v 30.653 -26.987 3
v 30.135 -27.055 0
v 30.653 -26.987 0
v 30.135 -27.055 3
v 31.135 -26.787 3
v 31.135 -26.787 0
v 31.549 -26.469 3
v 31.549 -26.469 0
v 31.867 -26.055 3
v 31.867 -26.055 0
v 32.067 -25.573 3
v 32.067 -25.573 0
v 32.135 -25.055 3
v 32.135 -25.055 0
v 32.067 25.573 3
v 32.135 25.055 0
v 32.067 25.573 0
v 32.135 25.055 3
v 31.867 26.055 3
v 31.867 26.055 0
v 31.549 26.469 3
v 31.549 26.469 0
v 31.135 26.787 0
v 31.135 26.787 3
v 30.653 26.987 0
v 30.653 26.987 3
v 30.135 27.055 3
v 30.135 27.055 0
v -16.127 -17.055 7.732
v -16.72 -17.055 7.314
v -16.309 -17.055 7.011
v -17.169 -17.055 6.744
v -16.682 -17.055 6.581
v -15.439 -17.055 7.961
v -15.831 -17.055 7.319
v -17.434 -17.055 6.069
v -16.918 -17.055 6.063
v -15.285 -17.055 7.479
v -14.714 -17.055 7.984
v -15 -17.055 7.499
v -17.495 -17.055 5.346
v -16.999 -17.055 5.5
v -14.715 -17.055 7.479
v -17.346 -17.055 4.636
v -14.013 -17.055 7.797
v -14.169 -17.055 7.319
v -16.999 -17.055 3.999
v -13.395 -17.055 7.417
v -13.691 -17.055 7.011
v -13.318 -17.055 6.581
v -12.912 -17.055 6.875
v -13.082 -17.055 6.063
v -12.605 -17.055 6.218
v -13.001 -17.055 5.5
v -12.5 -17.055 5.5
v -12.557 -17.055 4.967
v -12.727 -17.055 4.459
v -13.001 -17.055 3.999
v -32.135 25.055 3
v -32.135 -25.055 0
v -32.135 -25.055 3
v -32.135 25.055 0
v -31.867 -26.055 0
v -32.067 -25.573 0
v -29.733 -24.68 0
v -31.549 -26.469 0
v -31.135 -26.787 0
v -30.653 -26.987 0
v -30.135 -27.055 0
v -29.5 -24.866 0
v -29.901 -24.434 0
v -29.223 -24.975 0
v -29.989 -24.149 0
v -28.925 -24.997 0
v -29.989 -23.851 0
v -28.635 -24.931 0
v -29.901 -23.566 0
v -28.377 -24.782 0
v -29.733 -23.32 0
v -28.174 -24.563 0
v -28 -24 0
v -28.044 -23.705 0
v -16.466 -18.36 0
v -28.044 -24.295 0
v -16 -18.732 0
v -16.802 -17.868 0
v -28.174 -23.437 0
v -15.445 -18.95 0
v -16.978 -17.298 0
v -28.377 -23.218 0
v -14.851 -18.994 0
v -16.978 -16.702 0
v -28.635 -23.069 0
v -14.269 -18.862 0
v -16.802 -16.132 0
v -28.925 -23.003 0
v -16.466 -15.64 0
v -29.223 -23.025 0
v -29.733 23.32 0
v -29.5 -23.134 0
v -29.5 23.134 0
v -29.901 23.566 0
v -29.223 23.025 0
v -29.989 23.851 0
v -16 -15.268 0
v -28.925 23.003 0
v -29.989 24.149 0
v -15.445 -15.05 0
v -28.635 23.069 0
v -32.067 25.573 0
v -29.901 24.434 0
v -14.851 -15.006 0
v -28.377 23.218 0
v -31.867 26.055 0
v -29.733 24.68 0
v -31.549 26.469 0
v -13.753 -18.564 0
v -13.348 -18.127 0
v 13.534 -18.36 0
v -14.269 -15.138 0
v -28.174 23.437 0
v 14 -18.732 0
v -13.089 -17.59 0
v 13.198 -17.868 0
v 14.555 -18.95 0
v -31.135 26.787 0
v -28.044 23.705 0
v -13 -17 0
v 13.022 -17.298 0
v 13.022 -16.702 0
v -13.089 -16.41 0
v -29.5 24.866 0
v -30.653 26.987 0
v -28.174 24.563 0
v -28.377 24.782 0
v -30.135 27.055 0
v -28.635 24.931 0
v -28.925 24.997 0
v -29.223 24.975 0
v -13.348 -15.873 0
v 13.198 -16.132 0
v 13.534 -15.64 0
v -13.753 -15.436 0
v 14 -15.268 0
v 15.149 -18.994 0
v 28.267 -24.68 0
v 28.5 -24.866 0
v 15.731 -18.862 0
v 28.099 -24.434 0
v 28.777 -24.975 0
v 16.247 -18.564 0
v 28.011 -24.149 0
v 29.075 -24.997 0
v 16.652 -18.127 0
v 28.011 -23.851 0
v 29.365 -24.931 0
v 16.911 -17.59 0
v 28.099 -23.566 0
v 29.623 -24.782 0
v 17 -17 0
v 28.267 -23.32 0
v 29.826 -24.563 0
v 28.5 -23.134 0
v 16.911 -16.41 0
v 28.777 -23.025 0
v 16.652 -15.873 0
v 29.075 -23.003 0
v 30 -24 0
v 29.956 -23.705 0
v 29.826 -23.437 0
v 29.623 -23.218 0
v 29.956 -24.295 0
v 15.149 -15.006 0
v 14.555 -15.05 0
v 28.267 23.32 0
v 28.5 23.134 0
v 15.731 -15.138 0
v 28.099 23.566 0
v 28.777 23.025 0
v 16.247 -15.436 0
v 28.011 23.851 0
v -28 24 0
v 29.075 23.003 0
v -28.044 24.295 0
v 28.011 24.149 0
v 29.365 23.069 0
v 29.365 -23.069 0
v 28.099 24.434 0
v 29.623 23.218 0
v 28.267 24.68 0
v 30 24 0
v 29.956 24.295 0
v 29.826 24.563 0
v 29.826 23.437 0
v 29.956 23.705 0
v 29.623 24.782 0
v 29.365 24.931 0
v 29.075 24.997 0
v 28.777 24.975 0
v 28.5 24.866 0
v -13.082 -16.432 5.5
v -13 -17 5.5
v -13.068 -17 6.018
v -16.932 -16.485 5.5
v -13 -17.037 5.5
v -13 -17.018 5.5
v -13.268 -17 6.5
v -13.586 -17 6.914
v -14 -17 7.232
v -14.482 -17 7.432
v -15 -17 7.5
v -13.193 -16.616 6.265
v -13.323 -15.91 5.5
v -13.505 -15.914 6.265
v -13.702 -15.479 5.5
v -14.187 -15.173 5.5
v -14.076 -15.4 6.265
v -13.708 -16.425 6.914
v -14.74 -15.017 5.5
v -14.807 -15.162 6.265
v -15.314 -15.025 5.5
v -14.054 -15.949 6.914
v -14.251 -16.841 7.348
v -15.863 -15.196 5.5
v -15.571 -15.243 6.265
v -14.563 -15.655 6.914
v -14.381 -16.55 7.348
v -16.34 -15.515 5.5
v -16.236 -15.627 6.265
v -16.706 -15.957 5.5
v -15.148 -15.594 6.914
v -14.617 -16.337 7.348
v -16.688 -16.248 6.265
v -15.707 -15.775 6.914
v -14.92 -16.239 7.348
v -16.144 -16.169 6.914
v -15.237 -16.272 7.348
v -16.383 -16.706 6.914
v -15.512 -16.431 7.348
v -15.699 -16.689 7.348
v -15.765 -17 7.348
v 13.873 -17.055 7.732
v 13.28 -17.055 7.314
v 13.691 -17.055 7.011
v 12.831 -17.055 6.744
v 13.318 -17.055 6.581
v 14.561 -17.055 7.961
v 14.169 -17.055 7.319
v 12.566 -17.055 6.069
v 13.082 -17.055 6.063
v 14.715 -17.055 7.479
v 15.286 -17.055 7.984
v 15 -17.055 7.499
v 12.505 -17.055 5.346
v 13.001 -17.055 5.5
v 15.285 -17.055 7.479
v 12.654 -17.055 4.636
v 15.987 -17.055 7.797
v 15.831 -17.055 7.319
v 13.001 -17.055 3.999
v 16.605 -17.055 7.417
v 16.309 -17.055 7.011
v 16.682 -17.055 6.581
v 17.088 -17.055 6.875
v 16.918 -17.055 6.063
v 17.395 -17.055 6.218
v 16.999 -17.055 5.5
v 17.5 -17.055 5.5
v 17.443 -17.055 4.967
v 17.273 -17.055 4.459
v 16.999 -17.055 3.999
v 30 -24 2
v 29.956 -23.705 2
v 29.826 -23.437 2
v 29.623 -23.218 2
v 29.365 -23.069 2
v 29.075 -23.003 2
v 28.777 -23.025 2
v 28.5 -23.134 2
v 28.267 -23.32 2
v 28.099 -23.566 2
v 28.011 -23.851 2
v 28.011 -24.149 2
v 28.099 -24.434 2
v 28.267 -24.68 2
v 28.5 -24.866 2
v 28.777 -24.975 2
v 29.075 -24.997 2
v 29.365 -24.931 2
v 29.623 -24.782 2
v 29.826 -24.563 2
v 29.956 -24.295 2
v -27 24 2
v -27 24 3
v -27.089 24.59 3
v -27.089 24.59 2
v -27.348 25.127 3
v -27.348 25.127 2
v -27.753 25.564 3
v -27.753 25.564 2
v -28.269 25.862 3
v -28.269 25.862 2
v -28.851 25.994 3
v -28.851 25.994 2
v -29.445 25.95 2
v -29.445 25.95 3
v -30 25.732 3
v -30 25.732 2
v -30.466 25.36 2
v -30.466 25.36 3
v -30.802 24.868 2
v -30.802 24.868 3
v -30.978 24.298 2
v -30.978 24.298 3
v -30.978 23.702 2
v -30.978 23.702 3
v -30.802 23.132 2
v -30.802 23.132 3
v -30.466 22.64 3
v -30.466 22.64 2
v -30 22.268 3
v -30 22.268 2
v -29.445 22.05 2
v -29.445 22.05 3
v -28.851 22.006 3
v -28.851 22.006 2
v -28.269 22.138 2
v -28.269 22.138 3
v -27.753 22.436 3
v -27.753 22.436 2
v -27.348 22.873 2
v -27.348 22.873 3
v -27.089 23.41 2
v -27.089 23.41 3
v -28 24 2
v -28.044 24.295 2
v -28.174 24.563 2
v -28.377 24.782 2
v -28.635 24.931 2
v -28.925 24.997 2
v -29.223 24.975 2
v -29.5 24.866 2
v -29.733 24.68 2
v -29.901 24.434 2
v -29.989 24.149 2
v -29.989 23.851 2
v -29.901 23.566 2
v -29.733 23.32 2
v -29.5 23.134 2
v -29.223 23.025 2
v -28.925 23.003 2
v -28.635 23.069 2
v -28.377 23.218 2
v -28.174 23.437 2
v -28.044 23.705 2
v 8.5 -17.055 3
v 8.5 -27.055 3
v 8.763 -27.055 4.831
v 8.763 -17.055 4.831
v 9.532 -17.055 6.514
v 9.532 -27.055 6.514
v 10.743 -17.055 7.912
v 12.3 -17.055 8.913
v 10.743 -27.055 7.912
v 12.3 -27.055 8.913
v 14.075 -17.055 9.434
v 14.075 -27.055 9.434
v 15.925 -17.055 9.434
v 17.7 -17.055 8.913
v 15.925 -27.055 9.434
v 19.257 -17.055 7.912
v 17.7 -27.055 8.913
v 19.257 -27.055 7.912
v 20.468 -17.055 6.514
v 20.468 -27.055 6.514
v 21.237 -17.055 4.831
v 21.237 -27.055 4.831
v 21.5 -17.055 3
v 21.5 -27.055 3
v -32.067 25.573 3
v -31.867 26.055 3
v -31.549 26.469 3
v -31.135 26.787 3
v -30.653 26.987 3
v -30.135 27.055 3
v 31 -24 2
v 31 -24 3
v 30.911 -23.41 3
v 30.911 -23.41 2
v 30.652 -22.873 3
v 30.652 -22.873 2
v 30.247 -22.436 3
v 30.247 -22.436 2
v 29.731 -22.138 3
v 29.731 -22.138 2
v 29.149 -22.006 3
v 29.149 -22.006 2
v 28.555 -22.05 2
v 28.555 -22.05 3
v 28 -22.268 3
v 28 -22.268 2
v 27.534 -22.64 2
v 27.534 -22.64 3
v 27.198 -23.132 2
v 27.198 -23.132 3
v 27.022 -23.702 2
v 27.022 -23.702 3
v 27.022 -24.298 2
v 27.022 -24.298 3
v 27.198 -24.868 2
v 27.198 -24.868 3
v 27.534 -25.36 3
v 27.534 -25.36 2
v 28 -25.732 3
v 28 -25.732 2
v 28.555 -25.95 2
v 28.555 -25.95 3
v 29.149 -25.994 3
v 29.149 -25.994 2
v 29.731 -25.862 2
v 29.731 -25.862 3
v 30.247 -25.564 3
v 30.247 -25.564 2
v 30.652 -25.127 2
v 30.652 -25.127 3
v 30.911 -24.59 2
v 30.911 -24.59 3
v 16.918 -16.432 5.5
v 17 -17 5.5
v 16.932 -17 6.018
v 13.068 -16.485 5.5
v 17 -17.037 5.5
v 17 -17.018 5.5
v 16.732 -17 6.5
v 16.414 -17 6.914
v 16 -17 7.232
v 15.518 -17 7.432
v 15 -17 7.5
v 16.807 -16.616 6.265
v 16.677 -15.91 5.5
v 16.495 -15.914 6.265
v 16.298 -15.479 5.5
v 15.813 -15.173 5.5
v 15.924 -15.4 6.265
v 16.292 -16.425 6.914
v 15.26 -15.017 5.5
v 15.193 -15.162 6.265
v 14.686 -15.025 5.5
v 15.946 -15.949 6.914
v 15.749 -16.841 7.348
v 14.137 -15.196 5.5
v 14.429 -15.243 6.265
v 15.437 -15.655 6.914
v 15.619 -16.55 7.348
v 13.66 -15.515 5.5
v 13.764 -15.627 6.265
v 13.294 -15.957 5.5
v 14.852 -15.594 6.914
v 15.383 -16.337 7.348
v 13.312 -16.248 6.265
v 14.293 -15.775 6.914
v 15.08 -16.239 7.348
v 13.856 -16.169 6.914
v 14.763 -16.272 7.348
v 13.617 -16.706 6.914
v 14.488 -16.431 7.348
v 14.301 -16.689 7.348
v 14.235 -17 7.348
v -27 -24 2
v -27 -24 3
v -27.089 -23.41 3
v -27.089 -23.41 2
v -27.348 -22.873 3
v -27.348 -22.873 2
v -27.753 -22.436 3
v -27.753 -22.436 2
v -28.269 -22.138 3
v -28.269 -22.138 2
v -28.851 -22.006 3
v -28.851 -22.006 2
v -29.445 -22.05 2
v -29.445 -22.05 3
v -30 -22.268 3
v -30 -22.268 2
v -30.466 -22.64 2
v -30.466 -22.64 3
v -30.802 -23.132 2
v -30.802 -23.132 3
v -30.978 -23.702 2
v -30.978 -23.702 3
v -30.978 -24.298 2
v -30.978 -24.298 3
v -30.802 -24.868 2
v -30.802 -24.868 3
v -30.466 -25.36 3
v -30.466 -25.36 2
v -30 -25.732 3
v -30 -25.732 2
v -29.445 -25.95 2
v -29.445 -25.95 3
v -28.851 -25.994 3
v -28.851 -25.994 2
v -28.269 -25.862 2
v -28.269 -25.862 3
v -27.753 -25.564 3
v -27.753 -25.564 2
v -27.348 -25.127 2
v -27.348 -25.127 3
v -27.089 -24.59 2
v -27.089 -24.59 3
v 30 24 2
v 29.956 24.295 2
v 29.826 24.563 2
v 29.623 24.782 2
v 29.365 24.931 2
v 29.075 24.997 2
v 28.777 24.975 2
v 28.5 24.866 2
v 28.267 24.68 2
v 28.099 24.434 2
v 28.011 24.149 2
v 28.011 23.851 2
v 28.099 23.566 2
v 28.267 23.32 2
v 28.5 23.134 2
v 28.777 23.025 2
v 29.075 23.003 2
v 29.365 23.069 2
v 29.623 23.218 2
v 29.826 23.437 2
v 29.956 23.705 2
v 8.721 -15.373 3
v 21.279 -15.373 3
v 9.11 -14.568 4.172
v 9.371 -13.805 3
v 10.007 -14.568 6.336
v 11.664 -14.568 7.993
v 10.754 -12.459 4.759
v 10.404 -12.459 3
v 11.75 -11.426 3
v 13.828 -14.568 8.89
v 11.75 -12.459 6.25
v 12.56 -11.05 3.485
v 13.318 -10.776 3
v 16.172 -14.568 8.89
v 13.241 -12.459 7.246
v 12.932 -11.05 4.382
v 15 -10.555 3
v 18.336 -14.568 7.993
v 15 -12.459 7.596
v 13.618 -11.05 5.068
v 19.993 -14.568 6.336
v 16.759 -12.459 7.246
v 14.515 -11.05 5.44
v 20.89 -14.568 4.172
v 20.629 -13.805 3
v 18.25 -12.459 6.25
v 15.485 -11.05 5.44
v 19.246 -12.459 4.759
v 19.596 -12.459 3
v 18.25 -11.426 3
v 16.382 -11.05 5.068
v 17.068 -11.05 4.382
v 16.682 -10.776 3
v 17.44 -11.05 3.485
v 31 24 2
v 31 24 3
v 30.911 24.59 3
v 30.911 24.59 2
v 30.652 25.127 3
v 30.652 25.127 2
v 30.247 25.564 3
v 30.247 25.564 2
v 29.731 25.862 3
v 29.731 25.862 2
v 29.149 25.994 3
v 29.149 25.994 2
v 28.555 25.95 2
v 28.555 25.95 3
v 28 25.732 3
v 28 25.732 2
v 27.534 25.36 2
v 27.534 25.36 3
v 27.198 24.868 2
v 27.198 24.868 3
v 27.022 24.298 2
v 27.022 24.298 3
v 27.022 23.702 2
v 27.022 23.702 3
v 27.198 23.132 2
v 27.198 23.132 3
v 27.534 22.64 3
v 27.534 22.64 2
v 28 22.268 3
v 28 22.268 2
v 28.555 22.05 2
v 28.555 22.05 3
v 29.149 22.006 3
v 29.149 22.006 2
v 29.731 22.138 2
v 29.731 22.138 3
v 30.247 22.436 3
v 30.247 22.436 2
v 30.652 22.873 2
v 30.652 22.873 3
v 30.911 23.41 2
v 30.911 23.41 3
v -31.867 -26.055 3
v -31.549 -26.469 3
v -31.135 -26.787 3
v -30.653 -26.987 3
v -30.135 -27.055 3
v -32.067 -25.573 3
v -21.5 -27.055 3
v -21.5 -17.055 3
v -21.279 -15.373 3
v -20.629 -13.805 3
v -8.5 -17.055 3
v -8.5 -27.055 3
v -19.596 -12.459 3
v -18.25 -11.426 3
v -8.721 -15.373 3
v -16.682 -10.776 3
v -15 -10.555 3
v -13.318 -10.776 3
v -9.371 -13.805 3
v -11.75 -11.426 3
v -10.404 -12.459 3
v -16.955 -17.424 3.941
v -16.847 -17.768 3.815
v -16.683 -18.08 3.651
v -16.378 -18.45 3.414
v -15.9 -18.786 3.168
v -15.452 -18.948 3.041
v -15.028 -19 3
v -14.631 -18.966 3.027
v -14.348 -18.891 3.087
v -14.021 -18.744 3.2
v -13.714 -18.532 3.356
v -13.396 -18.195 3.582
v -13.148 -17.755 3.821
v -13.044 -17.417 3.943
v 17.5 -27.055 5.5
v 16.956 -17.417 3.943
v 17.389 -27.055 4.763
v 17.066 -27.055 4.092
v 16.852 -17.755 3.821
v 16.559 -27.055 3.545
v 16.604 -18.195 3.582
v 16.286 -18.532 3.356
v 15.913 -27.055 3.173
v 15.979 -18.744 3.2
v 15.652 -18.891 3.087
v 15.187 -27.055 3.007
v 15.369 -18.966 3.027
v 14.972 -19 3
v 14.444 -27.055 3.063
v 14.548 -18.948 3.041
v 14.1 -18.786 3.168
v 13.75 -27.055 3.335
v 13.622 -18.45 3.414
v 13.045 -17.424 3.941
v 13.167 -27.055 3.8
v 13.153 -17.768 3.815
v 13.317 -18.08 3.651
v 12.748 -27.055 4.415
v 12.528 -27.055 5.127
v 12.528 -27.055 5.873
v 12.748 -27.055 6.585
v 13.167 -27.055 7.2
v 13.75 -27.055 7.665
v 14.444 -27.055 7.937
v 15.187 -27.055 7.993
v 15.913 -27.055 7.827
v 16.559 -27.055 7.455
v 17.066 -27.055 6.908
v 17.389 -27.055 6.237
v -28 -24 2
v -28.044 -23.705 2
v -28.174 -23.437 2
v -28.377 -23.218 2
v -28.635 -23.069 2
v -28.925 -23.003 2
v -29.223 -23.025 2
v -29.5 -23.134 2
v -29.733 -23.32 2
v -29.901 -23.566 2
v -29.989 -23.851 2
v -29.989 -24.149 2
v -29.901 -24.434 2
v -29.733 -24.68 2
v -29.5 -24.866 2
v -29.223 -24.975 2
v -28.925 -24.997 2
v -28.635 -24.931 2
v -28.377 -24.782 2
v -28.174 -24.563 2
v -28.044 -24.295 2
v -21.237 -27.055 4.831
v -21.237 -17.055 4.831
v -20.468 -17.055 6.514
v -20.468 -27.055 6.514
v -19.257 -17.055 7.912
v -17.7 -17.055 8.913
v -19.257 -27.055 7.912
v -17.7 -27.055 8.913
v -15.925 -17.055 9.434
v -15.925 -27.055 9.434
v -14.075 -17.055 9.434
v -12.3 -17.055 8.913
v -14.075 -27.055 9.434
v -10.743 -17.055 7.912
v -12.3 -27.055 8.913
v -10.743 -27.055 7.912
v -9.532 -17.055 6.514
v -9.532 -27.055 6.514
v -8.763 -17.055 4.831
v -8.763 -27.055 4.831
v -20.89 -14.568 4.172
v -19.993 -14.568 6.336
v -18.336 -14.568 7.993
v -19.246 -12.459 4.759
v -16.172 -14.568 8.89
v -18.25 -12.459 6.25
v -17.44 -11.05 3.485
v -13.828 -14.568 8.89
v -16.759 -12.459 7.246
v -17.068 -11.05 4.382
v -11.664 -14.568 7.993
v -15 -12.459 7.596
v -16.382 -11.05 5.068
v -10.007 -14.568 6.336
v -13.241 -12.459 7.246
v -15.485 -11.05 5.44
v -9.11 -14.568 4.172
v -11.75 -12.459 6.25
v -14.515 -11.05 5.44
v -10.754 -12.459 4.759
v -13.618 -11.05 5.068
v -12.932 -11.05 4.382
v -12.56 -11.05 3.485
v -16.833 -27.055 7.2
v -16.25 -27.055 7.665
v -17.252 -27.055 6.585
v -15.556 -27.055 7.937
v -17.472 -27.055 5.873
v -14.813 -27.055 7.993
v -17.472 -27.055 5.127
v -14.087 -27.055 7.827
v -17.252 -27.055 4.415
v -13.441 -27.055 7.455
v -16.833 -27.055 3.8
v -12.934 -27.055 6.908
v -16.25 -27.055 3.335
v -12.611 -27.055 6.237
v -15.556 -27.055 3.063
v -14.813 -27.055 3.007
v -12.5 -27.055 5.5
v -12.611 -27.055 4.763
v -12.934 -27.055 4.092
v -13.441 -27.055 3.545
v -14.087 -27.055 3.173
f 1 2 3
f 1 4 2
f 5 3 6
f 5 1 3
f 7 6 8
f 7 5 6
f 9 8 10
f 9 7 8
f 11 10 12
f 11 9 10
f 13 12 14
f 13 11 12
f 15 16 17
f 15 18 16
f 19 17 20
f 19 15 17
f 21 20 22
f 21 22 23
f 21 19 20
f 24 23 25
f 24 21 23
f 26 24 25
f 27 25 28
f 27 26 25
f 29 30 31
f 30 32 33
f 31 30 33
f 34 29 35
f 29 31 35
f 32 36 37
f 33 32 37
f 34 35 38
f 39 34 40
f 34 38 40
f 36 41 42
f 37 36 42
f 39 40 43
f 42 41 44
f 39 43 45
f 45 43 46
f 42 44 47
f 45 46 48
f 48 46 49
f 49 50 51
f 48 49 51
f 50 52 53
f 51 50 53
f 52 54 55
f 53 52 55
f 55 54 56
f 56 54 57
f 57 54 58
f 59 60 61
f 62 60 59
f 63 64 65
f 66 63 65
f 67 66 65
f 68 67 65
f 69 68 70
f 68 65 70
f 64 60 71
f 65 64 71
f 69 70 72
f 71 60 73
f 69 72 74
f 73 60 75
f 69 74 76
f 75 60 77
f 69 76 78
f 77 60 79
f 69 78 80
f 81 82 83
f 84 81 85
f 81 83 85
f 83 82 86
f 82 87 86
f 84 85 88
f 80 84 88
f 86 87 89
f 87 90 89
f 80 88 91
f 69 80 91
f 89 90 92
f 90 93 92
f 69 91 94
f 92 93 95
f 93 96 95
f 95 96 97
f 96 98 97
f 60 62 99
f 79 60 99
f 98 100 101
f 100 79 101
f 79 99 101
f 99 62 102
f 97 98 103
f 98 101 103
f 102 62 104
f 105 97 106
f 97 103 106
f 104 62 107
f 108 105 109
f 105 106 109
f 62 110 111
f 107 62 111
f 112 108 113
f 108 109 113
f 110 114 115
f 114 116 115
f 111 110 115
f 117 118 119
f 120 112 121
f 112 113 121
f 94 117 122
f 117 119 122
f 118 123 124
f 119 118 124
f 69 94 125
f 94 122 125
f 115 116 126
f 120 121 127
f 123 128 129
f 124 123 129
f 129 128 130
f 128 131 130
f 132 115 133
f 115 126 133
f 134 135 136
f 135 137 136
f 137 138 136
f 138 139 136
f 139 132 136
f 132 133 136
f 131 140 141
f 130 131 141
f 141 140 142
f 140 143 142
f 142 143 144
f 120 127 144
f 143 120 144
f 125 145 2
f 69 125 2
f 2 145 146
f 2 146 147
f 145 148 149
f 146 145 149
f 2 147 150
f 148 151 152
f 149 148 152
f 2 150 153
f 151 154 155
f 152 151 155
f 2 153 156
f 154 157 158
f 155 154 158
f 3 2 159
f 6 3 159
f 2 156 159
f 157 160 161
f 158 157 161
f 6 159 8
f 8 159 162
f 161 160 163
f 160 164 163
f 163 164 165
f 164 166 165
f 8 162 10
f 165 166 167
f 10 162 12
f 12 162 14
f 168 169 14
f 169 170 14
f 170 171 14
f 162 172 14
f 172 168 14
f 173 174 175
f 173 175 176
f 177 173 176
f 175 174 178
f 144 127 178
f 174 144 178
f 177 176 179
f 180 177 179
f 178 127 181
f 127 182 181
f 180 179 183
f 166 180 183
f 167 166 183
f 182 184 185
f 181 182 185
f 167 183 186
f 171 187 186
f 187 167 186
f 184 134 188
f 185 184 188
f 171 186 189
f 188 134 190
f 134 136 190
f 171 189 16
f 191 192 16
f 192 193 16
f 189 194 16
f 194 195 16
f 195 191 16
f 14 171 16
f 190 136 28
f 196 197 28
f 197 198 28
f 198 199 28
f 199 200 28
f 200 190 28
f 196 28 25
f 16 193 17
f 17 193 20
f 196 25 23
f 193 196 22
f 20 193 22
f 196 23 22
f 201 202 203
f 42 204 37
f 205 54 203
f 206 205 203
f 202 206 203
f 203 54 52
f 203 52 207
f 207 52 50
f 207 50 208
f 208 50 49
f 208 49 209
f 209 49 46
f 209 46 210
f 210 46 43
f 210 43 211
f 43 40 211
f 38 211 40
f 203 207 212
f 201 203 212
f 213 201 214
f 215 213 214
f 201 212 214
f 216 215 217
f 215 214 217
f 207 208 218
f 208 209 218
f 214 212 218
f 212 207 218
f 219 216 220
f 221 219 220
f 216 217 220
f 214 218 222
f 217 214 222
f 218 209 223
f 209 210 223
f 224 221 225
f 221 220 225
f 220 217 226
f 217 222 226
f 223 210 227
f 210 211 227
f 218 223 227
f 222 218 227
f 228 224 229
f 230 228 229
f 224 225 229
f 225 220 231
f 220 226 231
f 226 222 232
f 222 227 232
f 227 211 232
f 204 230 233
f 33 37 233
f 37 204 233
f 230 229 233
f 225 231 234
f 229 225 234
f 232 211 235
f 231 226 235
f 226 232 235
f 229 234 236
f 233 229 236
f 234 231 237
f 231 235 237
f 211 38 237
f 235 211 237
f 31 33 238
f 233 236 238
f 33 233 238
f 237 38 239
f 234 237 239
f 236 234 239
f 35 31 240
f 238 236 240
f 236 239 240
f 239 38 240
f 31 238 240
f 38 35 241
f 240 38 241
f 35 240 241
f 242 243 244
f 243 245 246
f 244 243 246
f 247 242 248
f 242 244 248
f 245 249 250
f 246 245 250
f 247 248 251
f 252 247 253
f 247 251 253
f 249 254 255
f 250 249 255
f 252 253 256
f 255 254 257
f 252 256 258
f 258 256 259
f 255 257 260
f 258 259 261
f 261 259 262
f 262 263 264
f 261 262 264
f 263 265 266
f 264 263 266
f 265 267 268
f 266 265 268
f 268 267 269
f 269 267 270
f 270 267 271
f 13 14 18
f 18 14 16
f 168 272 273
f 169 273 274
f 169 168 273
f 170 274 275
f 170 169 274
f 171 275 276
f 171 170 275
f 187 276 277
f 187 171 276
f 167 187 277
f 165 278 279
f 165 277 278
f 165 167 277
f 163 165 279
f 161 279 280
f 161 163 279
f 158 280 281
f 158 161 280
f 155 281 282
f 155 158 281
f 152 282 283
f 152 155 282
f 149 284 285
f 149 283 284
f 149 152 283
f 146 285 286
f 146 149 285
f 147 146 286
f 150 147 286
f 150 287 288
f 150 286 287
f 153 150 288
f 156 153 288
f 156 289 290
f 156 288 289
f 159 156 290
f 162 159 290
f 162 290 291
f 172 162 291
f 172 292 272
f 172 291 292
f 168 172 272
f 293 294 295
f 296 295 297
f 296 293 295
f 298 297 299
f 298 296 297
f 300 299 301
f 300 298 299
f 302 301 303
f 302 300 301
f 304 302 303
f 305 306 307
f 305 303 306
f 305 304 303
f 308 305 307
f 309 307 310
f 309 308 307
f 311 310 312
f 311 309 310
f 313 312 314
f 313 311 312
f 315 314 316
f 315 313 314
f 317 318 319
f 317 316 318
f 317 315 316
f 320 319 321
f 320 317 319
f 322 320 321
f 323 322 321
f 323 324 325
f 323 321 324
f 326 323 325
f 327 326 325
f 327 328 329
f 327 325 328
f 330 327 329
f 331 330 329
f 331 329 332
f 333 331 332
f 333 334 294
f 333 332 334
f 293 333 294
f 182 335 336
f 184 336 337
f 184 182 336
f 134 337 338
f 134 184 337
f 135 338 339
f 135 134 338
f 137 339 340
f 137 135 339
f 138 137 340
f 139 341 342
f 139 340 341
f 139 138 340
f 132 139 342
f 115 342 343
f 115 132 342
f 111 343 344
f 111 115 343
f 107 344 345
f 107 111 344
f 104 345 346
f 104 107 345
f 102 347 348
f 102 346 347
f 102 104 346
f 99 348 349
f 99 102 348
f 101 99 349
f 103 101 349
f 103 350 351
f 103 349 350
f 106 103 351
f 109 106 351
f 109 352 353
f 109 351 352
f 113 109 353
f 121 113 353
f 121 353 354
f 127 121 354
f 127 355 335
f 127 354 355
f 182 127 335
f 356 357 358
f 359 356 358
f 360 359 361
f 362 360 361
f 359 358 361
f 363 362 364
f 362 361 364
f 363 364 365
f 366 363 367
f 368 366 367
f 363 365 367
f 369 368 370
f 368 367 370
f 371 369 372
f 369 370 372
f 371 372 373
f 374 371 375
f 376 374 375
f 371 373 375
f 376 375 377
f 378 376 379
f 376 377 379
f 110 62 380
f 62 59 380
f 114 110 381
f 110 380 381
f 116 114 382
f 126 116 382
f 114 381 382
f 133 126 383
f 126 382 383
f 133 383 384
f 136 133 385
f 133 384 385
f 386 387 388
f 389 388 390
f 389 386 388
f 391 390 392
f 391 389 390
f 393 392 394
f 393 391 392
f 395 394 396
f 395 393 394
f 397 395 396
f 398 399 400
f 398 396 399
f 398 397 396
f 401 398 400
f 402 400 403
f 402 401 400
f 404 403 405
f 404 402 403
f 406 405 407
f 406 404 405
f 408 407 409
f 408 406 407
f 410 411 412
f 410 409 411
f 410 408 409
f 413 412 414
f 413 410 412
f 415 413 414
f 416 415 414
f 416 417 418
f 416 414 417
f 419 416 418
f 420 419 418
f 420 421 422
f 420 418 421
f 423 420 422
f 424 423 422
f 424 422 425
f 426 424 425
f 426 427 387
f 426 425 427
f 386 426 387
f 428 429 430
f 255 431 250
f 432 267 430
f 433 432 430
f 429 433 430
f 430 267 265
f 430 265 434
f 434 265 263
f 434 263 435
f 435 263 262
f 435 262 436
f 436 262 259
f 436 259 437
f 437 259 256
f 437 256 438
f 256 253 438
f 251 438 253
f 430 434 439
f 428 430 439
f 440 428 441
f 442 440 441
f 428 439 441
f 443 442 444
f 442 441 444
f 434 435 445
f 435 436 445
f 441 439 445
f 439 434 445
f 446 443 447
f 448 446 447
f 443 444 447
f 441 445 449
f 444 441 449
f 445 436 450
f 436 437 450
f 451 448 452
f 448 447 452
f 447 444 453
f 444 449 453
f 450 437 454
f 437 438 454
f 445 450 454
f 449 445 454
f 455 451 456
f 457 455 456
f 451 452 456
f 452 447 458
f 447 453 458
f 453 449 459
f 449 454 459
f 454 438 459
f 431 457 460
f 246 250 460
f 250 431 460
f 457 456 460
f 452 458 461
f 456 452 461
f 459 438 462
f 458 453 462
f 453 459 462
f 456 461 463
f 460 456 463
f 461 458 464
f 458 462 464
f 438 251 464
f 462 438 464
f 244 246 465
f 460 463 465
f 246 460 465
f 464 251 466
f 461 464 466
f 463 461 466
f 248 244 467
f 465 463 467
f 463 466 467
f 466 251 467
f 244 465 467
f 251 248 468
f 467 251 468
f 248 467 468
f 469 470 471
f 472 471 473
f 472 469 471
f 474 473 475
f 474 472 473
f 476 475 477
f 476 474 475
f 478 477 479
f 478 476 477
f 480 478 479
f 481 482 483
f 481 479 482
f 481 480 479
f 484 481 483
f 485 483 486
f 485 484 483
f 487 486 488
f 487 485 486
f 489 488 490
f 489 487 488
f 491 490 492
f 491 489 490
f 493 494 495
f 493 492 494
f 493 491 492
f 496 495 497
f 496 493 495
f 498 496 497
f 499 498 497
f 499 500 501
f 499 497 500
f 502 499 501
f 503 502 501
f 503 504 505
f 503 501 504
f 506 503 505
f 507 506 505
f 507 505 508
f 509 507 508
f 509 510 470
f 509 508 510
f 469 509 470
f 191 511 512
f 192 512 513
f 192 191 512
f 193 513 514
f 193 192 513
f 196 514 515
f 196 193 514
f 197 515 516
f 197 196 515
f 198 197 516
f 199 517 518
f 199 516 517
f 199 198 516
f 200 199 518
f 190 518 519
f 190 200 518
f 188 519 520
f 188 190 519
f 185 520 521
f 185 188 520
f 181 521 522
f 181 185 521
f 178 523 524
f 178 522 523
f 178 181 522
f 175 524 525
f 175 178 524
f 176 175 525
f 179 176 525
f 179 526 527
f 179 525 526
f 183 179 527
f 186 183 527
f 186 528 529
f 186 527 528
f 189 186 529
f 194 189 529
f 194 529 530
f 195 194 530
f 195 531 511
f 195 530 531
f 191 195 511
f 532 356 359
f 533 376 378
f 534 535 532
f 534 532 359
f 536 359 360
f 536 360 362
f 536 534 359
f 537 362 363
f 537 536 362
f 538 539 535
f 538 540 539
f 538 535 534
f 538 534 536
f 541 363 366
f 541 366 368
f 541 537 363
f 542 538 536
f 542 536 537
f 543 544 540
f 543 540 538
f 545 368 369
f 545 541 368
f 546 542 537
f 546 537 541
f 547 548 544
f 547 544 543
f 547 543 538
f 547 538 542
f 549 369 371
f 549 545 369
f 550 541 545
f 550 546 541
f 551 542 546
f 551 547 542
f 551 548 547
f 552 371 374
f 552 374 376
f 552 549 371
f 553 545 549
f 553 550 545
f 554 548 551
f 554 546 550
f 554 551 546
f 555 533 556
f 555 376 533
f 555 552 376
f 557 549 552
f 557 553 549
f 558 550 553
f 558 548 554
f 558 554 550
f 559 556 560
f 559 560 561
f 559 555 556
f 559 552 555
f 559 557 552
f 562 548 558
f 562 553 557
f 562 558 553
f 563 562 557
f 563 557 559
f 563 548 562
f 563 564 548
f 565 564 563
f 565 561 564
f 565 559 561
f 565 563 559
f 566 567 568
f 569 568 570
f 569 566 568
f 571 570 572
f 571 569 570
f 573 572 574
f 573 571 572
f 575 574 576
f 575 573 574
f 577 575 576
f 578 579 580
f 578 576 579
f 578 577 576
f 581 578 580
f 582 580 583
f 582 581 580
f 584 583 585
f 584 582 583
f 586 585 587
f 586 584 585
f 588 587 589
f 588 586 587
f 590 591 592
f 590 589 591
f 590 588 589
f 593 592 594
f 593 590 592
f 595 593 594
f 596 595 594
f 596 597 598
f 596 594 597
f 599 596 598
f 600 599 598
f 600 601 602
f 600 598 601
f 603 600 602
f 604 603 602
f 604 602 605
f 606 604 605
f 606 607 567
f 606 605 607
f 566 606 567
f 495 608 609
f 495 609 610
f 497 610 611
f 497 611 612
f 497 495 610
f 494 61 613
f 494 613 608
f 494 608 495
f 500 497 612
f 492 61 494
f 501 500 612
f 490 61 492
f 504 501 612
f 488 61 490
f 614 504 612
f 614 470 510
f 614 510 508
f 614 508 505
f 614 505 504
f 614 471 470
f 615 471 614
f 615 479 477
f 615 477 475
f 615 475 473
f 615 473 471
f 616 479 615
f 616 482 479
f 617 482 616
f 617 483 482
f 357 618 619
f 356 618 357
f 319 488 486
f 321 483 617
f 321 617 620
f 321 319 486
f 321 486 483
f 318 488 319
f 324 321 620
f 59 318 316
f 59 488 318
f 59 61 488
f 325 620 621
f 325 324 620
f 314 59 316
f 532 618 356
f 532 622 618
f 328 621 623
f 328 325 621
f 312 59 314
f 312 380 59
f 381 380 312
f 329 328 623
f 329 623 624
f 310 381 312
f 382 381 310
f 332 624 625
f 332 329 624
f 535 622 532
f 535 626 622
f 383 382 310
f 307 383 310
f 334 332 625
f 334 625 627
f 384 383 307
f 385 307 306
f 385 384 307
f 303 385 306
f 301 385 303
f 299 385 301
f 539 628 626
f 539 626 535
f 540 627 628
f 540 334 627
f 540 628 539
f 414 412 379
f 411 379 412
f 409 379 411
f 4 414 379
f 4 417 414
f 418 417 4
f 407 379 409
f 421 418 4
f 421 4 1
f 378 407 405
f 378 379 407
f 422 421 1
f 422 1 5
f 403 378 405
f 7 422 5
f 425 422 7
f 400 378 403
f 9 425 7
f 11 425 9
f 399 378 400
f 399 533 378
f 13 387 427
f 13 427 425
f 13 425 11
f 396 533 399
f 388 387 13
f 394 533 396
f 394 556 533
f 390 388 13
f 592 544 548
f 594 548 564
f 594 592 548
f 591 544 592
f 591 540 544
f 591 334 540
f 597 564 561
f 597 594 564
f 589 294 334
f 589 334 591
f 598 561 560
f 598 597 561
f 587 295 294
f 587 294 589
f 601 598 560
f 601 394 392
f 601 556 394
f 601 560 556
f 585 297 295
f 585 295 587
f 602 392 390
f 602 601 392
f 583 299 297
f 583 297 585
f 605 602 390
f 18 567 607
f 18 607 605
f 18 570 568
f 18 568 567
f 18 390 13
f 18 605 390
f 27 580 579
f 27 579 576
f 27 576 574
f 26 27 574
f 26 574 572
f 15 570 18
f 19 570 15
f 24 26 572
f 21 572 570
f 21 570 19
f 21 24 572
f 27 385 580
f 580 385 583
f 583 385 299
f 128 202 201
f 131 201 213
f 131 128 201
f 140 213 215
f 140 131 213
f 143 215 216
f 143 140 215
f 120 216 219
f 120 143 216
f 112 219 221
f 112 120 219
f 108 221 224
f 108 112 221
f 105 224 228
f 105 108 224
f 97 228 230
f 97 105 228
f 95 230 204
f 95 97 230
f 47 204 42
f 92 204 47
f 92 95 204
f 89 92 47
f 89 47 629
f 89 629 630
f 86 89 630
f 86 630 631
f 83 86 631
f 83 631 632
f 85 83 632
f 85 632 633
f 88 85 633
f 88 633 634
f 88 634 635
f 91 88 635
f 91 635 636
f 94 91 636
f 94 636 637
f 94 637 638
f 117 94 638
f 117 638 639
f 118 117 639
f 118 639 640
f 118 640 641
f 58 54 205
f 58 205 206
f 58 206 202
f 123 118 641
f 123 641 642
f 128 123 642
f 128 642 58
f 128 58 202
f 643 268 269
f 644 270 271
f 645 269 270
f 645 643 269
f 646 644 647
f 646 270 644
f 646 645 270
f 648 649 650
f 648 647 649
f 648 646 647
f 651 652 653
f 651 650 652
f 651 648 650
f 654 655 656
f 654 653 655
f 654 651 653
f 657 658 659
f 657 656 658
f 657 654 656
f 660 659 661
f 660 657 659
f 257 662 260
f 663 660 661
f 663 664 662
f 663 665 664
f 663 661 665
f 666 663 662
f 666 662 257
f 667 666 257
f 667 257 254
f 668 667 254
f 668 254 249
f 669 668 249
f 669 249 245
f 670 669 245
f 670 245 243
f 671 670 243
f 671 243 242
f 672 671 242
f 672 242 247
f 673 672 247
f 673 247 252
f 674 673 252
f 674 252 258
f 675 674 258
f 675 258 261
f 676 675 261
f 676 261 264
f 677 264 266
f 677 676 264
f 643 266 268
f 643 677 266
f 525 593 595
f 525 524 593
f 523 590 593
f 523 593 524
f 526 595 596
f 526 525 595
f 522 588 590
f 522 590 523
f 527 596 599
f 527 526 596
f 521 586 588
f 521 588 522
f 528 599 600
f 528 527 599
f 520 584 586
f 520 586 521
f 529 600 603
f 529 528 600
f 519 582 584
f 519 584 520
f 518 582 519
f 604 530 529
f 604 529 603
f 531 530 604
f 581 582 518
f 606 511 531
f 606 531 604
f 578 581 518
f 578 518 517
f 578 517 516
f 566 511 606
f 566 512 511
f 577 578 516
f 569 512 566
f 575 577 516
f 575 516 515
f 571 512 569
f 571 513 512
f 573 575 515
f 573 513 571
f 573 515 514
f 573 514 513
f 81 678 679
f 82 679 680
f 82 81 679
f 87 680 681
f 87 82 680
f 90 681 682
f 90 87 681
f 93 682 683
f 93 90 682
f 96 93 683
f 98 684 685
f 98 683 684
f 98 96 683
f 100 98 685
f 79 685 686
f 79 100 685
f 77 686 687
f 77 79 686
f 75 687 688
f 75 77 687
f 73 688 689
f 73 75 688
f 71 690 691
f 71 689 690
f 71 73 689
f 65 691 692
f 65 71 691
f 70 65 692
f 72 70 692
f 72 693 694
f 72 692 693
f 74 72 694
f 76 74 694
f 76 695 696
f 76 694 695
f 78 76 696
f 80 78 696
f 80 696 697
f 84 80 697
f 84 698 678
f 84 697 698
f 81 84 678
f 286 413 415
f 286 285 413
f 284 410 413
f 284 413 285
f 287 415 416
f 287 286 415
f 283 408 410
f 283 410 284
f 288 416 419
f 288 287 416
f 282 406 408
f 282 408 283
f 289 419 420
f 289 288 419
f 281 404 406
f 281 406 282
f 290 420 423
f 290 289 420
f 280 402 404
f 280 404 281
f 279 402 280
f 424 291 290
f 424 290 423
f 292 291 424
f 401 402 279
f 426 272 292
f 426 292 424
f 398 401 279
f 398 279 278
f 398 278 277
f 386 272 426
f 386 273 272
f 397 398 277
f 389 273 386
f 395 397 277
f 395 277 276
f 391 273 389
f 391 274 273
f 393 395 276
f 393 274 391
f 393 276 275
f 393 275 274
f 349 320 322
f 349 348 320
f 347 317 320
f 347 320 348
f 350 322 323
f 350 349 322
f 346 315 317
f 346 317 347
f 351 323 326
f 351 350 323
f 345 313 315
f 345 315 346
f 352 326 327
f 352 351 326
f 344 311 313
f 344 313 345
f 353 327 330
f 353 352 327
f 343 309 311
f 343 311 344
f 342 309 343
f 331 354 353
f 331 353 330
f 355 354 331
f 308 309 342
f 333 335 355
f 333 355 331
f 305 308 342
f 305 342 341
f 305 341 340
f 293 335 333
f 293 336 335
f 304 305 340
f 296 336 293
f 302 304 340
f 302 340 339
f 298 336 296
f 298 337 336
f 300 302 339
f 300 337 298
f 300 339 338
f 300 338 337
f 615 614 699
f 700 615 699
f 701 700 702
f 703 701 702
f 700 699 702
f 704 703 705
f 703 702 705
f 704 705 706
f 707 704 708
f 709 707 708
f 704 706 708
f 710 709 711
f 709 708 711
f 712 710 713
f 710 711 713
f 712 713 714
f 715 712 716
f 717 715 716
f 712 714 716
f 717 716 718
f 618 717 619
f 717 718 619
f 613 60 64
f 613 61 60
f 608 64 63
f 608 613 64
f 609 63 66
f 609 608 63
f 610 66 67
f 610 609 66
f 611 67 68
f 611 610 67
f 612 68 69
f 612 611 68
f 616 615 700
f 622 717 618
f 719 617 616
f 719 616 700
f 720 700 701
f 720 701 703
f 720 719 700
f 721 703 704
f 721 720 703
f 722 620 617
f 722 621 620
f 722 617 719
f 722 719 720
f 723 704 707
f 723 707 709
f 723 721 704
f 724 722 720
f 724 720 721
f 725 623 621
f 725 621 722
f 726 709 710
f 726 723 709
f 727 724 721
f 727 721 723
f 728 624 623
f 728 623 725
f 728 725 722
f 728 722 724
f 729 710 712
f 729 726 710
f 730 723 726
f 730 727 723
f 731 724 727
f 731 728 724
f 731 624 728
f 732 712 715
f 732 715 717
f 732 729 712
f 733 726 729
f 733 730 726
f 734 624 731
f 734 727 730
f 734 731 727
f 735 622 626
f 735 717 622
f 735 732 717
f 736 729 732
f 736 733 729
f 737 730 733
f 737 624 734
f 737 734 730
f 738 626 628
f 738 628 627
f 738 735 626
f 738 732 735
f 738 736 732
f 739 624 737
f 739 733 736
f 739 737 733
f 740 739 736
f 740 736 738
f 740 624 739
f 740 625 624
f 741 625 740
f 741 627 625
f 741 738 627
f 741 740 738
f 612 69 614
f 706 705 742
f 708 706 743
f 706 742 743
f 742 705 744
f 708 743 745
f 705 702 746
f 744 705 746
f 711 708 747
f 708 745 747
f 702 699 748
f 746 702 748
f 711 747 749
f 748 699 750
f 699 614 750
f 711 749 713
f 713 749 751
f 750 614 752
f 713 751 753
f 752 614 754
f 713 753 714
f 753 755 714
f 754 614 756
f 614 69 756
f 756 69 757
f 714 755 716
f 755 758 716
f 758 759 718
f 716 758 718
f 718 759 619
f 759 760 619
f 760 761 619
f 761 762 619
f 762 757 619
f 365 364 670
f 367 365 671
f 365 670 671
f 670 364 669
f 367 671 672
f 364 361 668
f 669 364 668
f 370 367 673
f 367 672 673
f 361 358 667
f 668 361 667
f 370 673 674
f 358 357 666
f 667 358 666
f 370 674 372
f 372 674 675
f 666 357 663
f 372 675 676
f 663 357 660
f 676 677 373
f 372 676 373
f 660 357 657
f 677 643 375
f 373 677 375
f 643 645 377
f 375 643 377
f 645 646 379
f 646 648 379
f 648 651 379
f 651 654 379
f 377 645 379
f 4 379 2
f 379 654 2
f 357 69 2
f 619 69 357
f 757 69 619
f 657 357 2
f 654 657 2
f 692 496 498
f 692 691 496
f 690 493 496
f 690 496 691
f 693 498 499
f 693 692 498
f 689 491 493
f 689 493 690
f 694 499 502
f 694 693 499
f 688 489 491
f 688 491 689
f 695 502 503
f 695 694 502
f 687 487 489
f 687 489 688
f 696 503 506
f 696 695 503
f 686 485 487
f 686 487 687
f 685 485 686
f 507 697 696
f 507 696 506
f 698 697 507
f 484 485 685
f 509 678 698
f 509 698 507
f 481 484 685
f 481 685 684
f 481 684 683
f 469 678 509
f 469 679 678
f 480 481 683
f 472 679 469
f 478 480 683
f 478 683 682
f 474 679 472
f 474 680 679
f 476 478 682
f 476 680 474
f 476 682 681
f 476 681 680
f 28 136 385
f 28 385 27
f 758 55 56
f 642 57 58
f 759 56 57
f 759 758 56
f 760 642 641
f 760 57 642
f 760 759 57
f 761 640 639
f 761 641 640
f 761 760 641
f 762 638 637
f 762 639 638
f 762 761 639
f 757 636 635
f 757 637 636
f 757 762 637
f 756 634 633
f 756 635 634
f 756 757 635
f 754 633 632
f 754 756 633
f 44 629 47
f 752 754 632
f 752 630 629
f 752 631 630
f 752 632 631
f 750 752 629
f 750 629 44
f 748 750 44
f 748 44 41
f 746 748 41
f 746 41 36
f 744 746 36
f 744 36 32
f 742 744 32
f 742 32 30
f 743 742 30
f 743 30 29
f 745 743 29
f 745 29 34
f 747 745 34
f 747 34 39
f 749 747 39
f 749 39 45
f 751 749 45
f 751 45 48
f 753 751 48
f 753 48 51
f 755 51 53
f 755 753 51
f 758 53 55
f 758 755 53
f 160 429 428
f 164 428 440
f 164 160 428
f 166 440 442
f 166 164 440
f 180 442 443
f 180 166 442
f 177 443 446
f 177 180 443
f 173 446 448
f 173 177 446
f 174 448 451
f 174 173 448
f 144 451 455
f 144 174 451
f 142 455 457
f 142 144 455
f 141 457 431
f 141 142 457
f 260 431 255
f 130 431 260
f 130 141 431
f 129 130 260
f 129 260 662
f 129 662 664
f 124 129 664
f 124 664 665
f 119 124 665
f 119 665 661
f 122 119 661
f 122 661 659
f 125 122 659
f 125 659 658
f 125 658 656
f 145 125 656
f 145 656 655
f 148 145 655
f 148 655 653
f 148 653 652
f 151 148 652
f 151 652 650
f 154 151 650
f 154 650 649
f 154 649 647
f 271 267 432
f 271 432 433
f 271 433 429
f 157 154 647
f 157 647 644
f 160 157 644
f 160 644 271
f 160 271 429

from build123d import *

# Parameters (mm, degrees)
CYLINDER012_R          = 2
CYLINDER012_DEPTH      = 5.5
CYLINDER013_R          = 2
CYLINDER013_DEPTH      = 5.5
BOX001_W               = 16
BOX001_H               = 10
BOX001_DEPTH           = 31
CYLINDER009_R          = 2.5
CYLINDER009_DEPTH      = 10
CYLINDER008_R          = 6.5
CYLINDER008_DEPTH      = 10
CUT001_PLACEMENT_ANGLE = 90
CYLINDER_R             = 2
CYLINDER_DEPTH         = 2
CYLINDER001_R          = 1
CYLINDER001_DEPTH      = 10
CYLINDER002_R          = 2
CYLINDER002_DEPTH      = 2
CYLINDER003_R          = 1
CYLINDER003_DEPTH      = 10
CYLINDER004_R          = 2
CYLINDER004_DEPTH      = 2
CYLINDER005_R          = 1
CYLINDER005_DEPTH      = 10
CYLINDER006_R          = 2
CYLINDER006_DEPTH      = 2
CYLINDER007_R          = 1
CYLINDER007_DEPTH      = 10
BOX_W                  = 64.27
BOX_H                  = 54.11
BOX_DEPTH              = 3
FILLET_R               = 2
BOX002_W               = 16
BOX002_H               = 10
BOX002_DEPTH           = 31
CYLINDER010_R          = 2.5
CYLINDER010_DEPTH      = 10
CYLINDER011_R          = 6.5
CYLINDER011_DEPTH      = 10
CUT002_PLACEMENT_ANGLE = 90


with BuildPart() as cylinder012:
    # Cylinder012 → Cylinder012 (new body)
    with BuildSketch(Plane(origin=(-15, -17, 0), x_dir=(1, 0, 0), z_dir=(0, 0, 1))):
        Circle(CYLINDER012_R)
    extrude(amount=CYLINDER012_DEPTH)


with BuildPart() as fusion016:
    # Sphere002 → Sphere002 (revolve)
    with BuildSketch(Plane(origin=(-15, -17, 5.5), x_dir=(1, 0, 0), z_dir=(0, -1, 0))):
        with BuildLine():
            ThreePointArc((0, -2), (2, 0), (0, 2))
            Line((0, 2), (0, -2))
        make_face()
    revolve(axis=Axis((-15, -17, 5.5), (0, 0, 1)))

    # Fusion016: union Cylinder012
    add(cylinder012.part)


with BuildPart() as cylinder013:
    # Cylinder013 → Cylinder013 (new body)
    with BuildSketch(Plane(origin=(-15, -17, 0), x_dir=(1, 0, 0), z_dir=(0, 0, 1))):
        Circle(CYLINDER013_R)
    extrude(amount=CYLINDER013_DEPTH)


with BuildPart() as fusion018:
    # Sphere003 → Sphere003 (revolve)
    with BuildSketch(Plane(origin=(-15, -17, 5.5), x_dir=(1, 0, 0), z_dir=(0, -1, 0))):
        with BuildLine():
            ThreePointArc((0, -2), (2, 0), (0, 2))
            Line((0, 2), (0, -2))
        make_face()
    revolve(axis=Axis((-15, -17, 5.5), (0, 0, 1)))

    # Fusion017: union Cylinder013
    add(cylinder013.part)


with BuildPart() as fusion018_1:
    # Fusion017 placement: moved
    add(fusion018.part.moved(Location((30, 0, 0))))

    # Fusion018: union Fusion016
    add(fusion016.part)


with BuildPart() as cube001:
    # Box001 → Box001 (new body)
    with BuildSketch(Plane(origin=(-8, 0, 0), x_dir=(1, 0, 0), z_dir=(0, 0, 1))):
        with Locations((8, 5)):
            Rectangle(BOX001_W, BOX001_H)
    extrude(amount=BOX001_DEPTH)


with BuildPart() as fusion011:
    # Cylinder009 → Cylinder009 (new body)
    with BuildSketch(Plane(origin=(0, -2.5, 0), x_dir=(1, 0, 0), z_dir=(0, 0, 1))):
        Circle(CYLINDER009_R)
    extrude(amount=CYLINDER009_DEPTH)

    # Fusion011: union Cube001
    add(cube001.part)


with BuildPart() as cylinder008:
    # Cylinder008 → Cylinder008 (new body)
    with BuildSketch(Plane.XY):
        Circle(CYLINDER008_R)
    extrude(amount=CYLINDER008_DEPTH)


with BuildPart() as hump:
    # Sphere → Sphere (revolve)
    with BuildSketch(Plane(origin=(0, 0, 10), x_dir=(1, 0, 0), z_dir=(0, -1, 0))):
        with BuildLine():
            ThreePointArc((0, -6.5), (6.5, 0), (0, 6.5))
            Line((0, 6.5), (0, -6.5))
        make_face()
    revolve(axis=Axis((0, 0, 10), (0, 0, 1)))

    # Fusion010: union Cylinder008
    add(cylinder008.part)

    # Cut001: cut Fusion011
    add(fusion011.part, mode=Mode.SUBTRACT)


with BuildPart() as hump_1:
    # Cut001 placement: moved
    add(hump.part.moved(Location((-15, -27.055, 3))).rotate(Axis((-15, -27.055, 3), (-1, 0, 0)), CUT001_PLACEMENT_ANGLE))


with BuildPart() as cylinder:
    # Cylinder → Cylinder (new body)
    with BuildSketch(Plane.XY.offset(2)):
        Circle(CYLINDER_R)
    extrude(amount=CYLINDER_DEPTH)


with BuildPart() as screwhole:
    # Cylinder001 → Cylinder001 (new body)
    with BuildSketch(Plane.XY):
        Circle(CYLINDER001_R)
    extrude(amount=CYLINDER001_DEPTH)

    # Fusion: union Cylinder
    add(cylinder.part)


with BuildPart() as screwhole_1:
    # Fusion placement: moved
    add(screwhole.part.moved(Location((29, 24, 0))))


with BuildPart() as cylinder002:
    # Cylinder002 → Cylinder002 (new body)
    with BuildSketch(Plane.XY.offset(2)):
        Circle(CYLINDER002_R)
    extrude(amount=CYLINDER002_DEPTH)


with BuildPart() as screwhole001:
    # Cylinder003 → Cylinder003 (new body)
    with BuildSketch(Plane.XY):
        Circle(CYLINDER003_R)
    extrude(amount=CYLINDER003_DEPTH)

    # Fusion006: union Cylinder002
    add(cylinder002.part)


with BuildPart() as screwhole001_1:
    # Fusion006 placement: moved
    add(screwhole001.part.moved(Location((-29, 24, 0))))


with BuildPart() as cylinder004:
    # Cylinder004 → Cylinder004 (new body)
    with BuildSketch(Plane.XY.offset(2)):
        Circle(CYLINDER004_R)
    extrude(amount=CYLINDER004_DEPTH)


with BuildPart() as screwhole002:
    # Cylinder005 → Cylinder005 (new body)
    with BuildSketch(Plane.XY):
        Circle(CYLINDER005_R)
    extrude(amount=CYLINDER005_DEPTH)

    # Fusion007: union Cylinder004
    add(cylinder004.part)


with BuildPart() as screwhole002_1:
    # Fusion007 placement: moved
    add(screwhole002.part.moved(Location((29, -24, 0))))


with BuildPart() as cylinder006:
    # Cylinder006 → Cylinder006 (new body)
    with BuildSketch(Plane.XY.offset(2)):
        Circle(CYLINDER006_R)
    extrude(amount=CYLINDER006_DEPTH)


with BuildPart() as screwholes:
    # Cylinder007 → Cylinder007 (new body)
    with BuildSketch(Plane.XY):
        Circle(CYLINDER007_R)
    extrude(amount=CYLINDER007_DEPTH)

    # Fusion008: union Cylinder006
    add(cylinder006.part)


with BuildPart() as screwholes_1:
    # Fusion008 placement: moved
    add(screwholes.part.moved(Location((-29, -24, 0))))

    # Fusion009: union screwHole, screwHole001, screwHole002
    add(screwhole_1.part)
    add(screwhole001_1.part)
    add(screwhole002_1.part)


with BuildPart() as cut:
    # Box → Box (new body)
    with BuildSketch(Plane(origin=(-32.135, -27.055, 0), x_dir=(1, 0, 0), z_dir=(0, 0, 1))):
        with Locations((32.135, 27.055)):
            Rectangle(BOX_W, BOX_H)
    extrude(amount=BOX_DEPTH)

    # Fillet
    fillet_edges = [cut.edges().sort_by_distance(p)[0] for p in [
        (-32.135, -27.055, 1.5),
        (-32.135, 27.055, 1.5),
        (32.135, -27.055, 1.5),
        (32.135, 27.055, 1.5),
    ]]
    fillet(fillet_edges, radius=FILLET_R)

    # Cut: cut ScrewHoles
    add(screwholes_1.part, mode=Mode.SUBTRACT)


with BuildPart() as cube002:
    # Box002 → Box002 (new body)
    with BuildSketch(Plane(origin=(-8, 0, 0), x_dir=(1, 0, 0), z_dir=(0, 0, 1))):
        with Locations((8, 5)):
            Rectangle(BOX002_W, BOX002_H)
    extrude(amount=BOX002_DEPTH)


with BuildPart() as fusion012:
    # Cylinder010 → Cylinder010 (new body)
    with BuildSketch(Plane(origin=(0, -2.5, 0), x_dir=(1, 0, 0), z_dir=(0, 0, 1))):
        Circle(CYLINDER010_R)
    extrude(amount=CYLINDER010_DEPTH)

    # Fusion012: union Cube002
    add(cube002.part)


with BuildPart() as cylinder011:
    # Cylinder011 → Cylinder011 (new body)
    with BuildSketch(Plane.XY):
        Circle(CYLINDER011_R)
    extrude(amount=CYLINDER011_DEPTH)


with BuildPart() as displayback:
    # Sphere001 → Sphere001 (revolve)
    with BuildSketch(Plane(origin=(0, 0, 10), x_dir=(1, 0, 0), z_dir=(0, -1, 0))):
        with BuildLine():
            ThreePointArc((0, -6.5), (6.5, 0), (0, 6.5))
            Line((0, 6.5), (0, -6.5))
        make_face()
    revolve(axis=Axis((0, 0, 10), (0, 0, 1)))

    # Fusion013: union Cylinder011
    add(cylinder011.part)

    # Cut002: cut Fusion012
    add(fusion012.part, mode=Mode.SUBTRACT)


with BuildPart() as displayback_1:
    # Cut002 placement: moved
    add(displayback.part.moved(Location((15, -27.055, 3))).rotate(Axis((15, -27.055, 3), (-1, 0, 0)), CUT002_PLACEMENT_ANGLE))

    # Fusion015: union Hump, Cut
    add(hump_1.part)
    add(cut.part)

    # Cut003: cut Fusion018
    add(fusion018_1.part, mode=Mode.SUBTRACT)


solid = displayback_1.part
